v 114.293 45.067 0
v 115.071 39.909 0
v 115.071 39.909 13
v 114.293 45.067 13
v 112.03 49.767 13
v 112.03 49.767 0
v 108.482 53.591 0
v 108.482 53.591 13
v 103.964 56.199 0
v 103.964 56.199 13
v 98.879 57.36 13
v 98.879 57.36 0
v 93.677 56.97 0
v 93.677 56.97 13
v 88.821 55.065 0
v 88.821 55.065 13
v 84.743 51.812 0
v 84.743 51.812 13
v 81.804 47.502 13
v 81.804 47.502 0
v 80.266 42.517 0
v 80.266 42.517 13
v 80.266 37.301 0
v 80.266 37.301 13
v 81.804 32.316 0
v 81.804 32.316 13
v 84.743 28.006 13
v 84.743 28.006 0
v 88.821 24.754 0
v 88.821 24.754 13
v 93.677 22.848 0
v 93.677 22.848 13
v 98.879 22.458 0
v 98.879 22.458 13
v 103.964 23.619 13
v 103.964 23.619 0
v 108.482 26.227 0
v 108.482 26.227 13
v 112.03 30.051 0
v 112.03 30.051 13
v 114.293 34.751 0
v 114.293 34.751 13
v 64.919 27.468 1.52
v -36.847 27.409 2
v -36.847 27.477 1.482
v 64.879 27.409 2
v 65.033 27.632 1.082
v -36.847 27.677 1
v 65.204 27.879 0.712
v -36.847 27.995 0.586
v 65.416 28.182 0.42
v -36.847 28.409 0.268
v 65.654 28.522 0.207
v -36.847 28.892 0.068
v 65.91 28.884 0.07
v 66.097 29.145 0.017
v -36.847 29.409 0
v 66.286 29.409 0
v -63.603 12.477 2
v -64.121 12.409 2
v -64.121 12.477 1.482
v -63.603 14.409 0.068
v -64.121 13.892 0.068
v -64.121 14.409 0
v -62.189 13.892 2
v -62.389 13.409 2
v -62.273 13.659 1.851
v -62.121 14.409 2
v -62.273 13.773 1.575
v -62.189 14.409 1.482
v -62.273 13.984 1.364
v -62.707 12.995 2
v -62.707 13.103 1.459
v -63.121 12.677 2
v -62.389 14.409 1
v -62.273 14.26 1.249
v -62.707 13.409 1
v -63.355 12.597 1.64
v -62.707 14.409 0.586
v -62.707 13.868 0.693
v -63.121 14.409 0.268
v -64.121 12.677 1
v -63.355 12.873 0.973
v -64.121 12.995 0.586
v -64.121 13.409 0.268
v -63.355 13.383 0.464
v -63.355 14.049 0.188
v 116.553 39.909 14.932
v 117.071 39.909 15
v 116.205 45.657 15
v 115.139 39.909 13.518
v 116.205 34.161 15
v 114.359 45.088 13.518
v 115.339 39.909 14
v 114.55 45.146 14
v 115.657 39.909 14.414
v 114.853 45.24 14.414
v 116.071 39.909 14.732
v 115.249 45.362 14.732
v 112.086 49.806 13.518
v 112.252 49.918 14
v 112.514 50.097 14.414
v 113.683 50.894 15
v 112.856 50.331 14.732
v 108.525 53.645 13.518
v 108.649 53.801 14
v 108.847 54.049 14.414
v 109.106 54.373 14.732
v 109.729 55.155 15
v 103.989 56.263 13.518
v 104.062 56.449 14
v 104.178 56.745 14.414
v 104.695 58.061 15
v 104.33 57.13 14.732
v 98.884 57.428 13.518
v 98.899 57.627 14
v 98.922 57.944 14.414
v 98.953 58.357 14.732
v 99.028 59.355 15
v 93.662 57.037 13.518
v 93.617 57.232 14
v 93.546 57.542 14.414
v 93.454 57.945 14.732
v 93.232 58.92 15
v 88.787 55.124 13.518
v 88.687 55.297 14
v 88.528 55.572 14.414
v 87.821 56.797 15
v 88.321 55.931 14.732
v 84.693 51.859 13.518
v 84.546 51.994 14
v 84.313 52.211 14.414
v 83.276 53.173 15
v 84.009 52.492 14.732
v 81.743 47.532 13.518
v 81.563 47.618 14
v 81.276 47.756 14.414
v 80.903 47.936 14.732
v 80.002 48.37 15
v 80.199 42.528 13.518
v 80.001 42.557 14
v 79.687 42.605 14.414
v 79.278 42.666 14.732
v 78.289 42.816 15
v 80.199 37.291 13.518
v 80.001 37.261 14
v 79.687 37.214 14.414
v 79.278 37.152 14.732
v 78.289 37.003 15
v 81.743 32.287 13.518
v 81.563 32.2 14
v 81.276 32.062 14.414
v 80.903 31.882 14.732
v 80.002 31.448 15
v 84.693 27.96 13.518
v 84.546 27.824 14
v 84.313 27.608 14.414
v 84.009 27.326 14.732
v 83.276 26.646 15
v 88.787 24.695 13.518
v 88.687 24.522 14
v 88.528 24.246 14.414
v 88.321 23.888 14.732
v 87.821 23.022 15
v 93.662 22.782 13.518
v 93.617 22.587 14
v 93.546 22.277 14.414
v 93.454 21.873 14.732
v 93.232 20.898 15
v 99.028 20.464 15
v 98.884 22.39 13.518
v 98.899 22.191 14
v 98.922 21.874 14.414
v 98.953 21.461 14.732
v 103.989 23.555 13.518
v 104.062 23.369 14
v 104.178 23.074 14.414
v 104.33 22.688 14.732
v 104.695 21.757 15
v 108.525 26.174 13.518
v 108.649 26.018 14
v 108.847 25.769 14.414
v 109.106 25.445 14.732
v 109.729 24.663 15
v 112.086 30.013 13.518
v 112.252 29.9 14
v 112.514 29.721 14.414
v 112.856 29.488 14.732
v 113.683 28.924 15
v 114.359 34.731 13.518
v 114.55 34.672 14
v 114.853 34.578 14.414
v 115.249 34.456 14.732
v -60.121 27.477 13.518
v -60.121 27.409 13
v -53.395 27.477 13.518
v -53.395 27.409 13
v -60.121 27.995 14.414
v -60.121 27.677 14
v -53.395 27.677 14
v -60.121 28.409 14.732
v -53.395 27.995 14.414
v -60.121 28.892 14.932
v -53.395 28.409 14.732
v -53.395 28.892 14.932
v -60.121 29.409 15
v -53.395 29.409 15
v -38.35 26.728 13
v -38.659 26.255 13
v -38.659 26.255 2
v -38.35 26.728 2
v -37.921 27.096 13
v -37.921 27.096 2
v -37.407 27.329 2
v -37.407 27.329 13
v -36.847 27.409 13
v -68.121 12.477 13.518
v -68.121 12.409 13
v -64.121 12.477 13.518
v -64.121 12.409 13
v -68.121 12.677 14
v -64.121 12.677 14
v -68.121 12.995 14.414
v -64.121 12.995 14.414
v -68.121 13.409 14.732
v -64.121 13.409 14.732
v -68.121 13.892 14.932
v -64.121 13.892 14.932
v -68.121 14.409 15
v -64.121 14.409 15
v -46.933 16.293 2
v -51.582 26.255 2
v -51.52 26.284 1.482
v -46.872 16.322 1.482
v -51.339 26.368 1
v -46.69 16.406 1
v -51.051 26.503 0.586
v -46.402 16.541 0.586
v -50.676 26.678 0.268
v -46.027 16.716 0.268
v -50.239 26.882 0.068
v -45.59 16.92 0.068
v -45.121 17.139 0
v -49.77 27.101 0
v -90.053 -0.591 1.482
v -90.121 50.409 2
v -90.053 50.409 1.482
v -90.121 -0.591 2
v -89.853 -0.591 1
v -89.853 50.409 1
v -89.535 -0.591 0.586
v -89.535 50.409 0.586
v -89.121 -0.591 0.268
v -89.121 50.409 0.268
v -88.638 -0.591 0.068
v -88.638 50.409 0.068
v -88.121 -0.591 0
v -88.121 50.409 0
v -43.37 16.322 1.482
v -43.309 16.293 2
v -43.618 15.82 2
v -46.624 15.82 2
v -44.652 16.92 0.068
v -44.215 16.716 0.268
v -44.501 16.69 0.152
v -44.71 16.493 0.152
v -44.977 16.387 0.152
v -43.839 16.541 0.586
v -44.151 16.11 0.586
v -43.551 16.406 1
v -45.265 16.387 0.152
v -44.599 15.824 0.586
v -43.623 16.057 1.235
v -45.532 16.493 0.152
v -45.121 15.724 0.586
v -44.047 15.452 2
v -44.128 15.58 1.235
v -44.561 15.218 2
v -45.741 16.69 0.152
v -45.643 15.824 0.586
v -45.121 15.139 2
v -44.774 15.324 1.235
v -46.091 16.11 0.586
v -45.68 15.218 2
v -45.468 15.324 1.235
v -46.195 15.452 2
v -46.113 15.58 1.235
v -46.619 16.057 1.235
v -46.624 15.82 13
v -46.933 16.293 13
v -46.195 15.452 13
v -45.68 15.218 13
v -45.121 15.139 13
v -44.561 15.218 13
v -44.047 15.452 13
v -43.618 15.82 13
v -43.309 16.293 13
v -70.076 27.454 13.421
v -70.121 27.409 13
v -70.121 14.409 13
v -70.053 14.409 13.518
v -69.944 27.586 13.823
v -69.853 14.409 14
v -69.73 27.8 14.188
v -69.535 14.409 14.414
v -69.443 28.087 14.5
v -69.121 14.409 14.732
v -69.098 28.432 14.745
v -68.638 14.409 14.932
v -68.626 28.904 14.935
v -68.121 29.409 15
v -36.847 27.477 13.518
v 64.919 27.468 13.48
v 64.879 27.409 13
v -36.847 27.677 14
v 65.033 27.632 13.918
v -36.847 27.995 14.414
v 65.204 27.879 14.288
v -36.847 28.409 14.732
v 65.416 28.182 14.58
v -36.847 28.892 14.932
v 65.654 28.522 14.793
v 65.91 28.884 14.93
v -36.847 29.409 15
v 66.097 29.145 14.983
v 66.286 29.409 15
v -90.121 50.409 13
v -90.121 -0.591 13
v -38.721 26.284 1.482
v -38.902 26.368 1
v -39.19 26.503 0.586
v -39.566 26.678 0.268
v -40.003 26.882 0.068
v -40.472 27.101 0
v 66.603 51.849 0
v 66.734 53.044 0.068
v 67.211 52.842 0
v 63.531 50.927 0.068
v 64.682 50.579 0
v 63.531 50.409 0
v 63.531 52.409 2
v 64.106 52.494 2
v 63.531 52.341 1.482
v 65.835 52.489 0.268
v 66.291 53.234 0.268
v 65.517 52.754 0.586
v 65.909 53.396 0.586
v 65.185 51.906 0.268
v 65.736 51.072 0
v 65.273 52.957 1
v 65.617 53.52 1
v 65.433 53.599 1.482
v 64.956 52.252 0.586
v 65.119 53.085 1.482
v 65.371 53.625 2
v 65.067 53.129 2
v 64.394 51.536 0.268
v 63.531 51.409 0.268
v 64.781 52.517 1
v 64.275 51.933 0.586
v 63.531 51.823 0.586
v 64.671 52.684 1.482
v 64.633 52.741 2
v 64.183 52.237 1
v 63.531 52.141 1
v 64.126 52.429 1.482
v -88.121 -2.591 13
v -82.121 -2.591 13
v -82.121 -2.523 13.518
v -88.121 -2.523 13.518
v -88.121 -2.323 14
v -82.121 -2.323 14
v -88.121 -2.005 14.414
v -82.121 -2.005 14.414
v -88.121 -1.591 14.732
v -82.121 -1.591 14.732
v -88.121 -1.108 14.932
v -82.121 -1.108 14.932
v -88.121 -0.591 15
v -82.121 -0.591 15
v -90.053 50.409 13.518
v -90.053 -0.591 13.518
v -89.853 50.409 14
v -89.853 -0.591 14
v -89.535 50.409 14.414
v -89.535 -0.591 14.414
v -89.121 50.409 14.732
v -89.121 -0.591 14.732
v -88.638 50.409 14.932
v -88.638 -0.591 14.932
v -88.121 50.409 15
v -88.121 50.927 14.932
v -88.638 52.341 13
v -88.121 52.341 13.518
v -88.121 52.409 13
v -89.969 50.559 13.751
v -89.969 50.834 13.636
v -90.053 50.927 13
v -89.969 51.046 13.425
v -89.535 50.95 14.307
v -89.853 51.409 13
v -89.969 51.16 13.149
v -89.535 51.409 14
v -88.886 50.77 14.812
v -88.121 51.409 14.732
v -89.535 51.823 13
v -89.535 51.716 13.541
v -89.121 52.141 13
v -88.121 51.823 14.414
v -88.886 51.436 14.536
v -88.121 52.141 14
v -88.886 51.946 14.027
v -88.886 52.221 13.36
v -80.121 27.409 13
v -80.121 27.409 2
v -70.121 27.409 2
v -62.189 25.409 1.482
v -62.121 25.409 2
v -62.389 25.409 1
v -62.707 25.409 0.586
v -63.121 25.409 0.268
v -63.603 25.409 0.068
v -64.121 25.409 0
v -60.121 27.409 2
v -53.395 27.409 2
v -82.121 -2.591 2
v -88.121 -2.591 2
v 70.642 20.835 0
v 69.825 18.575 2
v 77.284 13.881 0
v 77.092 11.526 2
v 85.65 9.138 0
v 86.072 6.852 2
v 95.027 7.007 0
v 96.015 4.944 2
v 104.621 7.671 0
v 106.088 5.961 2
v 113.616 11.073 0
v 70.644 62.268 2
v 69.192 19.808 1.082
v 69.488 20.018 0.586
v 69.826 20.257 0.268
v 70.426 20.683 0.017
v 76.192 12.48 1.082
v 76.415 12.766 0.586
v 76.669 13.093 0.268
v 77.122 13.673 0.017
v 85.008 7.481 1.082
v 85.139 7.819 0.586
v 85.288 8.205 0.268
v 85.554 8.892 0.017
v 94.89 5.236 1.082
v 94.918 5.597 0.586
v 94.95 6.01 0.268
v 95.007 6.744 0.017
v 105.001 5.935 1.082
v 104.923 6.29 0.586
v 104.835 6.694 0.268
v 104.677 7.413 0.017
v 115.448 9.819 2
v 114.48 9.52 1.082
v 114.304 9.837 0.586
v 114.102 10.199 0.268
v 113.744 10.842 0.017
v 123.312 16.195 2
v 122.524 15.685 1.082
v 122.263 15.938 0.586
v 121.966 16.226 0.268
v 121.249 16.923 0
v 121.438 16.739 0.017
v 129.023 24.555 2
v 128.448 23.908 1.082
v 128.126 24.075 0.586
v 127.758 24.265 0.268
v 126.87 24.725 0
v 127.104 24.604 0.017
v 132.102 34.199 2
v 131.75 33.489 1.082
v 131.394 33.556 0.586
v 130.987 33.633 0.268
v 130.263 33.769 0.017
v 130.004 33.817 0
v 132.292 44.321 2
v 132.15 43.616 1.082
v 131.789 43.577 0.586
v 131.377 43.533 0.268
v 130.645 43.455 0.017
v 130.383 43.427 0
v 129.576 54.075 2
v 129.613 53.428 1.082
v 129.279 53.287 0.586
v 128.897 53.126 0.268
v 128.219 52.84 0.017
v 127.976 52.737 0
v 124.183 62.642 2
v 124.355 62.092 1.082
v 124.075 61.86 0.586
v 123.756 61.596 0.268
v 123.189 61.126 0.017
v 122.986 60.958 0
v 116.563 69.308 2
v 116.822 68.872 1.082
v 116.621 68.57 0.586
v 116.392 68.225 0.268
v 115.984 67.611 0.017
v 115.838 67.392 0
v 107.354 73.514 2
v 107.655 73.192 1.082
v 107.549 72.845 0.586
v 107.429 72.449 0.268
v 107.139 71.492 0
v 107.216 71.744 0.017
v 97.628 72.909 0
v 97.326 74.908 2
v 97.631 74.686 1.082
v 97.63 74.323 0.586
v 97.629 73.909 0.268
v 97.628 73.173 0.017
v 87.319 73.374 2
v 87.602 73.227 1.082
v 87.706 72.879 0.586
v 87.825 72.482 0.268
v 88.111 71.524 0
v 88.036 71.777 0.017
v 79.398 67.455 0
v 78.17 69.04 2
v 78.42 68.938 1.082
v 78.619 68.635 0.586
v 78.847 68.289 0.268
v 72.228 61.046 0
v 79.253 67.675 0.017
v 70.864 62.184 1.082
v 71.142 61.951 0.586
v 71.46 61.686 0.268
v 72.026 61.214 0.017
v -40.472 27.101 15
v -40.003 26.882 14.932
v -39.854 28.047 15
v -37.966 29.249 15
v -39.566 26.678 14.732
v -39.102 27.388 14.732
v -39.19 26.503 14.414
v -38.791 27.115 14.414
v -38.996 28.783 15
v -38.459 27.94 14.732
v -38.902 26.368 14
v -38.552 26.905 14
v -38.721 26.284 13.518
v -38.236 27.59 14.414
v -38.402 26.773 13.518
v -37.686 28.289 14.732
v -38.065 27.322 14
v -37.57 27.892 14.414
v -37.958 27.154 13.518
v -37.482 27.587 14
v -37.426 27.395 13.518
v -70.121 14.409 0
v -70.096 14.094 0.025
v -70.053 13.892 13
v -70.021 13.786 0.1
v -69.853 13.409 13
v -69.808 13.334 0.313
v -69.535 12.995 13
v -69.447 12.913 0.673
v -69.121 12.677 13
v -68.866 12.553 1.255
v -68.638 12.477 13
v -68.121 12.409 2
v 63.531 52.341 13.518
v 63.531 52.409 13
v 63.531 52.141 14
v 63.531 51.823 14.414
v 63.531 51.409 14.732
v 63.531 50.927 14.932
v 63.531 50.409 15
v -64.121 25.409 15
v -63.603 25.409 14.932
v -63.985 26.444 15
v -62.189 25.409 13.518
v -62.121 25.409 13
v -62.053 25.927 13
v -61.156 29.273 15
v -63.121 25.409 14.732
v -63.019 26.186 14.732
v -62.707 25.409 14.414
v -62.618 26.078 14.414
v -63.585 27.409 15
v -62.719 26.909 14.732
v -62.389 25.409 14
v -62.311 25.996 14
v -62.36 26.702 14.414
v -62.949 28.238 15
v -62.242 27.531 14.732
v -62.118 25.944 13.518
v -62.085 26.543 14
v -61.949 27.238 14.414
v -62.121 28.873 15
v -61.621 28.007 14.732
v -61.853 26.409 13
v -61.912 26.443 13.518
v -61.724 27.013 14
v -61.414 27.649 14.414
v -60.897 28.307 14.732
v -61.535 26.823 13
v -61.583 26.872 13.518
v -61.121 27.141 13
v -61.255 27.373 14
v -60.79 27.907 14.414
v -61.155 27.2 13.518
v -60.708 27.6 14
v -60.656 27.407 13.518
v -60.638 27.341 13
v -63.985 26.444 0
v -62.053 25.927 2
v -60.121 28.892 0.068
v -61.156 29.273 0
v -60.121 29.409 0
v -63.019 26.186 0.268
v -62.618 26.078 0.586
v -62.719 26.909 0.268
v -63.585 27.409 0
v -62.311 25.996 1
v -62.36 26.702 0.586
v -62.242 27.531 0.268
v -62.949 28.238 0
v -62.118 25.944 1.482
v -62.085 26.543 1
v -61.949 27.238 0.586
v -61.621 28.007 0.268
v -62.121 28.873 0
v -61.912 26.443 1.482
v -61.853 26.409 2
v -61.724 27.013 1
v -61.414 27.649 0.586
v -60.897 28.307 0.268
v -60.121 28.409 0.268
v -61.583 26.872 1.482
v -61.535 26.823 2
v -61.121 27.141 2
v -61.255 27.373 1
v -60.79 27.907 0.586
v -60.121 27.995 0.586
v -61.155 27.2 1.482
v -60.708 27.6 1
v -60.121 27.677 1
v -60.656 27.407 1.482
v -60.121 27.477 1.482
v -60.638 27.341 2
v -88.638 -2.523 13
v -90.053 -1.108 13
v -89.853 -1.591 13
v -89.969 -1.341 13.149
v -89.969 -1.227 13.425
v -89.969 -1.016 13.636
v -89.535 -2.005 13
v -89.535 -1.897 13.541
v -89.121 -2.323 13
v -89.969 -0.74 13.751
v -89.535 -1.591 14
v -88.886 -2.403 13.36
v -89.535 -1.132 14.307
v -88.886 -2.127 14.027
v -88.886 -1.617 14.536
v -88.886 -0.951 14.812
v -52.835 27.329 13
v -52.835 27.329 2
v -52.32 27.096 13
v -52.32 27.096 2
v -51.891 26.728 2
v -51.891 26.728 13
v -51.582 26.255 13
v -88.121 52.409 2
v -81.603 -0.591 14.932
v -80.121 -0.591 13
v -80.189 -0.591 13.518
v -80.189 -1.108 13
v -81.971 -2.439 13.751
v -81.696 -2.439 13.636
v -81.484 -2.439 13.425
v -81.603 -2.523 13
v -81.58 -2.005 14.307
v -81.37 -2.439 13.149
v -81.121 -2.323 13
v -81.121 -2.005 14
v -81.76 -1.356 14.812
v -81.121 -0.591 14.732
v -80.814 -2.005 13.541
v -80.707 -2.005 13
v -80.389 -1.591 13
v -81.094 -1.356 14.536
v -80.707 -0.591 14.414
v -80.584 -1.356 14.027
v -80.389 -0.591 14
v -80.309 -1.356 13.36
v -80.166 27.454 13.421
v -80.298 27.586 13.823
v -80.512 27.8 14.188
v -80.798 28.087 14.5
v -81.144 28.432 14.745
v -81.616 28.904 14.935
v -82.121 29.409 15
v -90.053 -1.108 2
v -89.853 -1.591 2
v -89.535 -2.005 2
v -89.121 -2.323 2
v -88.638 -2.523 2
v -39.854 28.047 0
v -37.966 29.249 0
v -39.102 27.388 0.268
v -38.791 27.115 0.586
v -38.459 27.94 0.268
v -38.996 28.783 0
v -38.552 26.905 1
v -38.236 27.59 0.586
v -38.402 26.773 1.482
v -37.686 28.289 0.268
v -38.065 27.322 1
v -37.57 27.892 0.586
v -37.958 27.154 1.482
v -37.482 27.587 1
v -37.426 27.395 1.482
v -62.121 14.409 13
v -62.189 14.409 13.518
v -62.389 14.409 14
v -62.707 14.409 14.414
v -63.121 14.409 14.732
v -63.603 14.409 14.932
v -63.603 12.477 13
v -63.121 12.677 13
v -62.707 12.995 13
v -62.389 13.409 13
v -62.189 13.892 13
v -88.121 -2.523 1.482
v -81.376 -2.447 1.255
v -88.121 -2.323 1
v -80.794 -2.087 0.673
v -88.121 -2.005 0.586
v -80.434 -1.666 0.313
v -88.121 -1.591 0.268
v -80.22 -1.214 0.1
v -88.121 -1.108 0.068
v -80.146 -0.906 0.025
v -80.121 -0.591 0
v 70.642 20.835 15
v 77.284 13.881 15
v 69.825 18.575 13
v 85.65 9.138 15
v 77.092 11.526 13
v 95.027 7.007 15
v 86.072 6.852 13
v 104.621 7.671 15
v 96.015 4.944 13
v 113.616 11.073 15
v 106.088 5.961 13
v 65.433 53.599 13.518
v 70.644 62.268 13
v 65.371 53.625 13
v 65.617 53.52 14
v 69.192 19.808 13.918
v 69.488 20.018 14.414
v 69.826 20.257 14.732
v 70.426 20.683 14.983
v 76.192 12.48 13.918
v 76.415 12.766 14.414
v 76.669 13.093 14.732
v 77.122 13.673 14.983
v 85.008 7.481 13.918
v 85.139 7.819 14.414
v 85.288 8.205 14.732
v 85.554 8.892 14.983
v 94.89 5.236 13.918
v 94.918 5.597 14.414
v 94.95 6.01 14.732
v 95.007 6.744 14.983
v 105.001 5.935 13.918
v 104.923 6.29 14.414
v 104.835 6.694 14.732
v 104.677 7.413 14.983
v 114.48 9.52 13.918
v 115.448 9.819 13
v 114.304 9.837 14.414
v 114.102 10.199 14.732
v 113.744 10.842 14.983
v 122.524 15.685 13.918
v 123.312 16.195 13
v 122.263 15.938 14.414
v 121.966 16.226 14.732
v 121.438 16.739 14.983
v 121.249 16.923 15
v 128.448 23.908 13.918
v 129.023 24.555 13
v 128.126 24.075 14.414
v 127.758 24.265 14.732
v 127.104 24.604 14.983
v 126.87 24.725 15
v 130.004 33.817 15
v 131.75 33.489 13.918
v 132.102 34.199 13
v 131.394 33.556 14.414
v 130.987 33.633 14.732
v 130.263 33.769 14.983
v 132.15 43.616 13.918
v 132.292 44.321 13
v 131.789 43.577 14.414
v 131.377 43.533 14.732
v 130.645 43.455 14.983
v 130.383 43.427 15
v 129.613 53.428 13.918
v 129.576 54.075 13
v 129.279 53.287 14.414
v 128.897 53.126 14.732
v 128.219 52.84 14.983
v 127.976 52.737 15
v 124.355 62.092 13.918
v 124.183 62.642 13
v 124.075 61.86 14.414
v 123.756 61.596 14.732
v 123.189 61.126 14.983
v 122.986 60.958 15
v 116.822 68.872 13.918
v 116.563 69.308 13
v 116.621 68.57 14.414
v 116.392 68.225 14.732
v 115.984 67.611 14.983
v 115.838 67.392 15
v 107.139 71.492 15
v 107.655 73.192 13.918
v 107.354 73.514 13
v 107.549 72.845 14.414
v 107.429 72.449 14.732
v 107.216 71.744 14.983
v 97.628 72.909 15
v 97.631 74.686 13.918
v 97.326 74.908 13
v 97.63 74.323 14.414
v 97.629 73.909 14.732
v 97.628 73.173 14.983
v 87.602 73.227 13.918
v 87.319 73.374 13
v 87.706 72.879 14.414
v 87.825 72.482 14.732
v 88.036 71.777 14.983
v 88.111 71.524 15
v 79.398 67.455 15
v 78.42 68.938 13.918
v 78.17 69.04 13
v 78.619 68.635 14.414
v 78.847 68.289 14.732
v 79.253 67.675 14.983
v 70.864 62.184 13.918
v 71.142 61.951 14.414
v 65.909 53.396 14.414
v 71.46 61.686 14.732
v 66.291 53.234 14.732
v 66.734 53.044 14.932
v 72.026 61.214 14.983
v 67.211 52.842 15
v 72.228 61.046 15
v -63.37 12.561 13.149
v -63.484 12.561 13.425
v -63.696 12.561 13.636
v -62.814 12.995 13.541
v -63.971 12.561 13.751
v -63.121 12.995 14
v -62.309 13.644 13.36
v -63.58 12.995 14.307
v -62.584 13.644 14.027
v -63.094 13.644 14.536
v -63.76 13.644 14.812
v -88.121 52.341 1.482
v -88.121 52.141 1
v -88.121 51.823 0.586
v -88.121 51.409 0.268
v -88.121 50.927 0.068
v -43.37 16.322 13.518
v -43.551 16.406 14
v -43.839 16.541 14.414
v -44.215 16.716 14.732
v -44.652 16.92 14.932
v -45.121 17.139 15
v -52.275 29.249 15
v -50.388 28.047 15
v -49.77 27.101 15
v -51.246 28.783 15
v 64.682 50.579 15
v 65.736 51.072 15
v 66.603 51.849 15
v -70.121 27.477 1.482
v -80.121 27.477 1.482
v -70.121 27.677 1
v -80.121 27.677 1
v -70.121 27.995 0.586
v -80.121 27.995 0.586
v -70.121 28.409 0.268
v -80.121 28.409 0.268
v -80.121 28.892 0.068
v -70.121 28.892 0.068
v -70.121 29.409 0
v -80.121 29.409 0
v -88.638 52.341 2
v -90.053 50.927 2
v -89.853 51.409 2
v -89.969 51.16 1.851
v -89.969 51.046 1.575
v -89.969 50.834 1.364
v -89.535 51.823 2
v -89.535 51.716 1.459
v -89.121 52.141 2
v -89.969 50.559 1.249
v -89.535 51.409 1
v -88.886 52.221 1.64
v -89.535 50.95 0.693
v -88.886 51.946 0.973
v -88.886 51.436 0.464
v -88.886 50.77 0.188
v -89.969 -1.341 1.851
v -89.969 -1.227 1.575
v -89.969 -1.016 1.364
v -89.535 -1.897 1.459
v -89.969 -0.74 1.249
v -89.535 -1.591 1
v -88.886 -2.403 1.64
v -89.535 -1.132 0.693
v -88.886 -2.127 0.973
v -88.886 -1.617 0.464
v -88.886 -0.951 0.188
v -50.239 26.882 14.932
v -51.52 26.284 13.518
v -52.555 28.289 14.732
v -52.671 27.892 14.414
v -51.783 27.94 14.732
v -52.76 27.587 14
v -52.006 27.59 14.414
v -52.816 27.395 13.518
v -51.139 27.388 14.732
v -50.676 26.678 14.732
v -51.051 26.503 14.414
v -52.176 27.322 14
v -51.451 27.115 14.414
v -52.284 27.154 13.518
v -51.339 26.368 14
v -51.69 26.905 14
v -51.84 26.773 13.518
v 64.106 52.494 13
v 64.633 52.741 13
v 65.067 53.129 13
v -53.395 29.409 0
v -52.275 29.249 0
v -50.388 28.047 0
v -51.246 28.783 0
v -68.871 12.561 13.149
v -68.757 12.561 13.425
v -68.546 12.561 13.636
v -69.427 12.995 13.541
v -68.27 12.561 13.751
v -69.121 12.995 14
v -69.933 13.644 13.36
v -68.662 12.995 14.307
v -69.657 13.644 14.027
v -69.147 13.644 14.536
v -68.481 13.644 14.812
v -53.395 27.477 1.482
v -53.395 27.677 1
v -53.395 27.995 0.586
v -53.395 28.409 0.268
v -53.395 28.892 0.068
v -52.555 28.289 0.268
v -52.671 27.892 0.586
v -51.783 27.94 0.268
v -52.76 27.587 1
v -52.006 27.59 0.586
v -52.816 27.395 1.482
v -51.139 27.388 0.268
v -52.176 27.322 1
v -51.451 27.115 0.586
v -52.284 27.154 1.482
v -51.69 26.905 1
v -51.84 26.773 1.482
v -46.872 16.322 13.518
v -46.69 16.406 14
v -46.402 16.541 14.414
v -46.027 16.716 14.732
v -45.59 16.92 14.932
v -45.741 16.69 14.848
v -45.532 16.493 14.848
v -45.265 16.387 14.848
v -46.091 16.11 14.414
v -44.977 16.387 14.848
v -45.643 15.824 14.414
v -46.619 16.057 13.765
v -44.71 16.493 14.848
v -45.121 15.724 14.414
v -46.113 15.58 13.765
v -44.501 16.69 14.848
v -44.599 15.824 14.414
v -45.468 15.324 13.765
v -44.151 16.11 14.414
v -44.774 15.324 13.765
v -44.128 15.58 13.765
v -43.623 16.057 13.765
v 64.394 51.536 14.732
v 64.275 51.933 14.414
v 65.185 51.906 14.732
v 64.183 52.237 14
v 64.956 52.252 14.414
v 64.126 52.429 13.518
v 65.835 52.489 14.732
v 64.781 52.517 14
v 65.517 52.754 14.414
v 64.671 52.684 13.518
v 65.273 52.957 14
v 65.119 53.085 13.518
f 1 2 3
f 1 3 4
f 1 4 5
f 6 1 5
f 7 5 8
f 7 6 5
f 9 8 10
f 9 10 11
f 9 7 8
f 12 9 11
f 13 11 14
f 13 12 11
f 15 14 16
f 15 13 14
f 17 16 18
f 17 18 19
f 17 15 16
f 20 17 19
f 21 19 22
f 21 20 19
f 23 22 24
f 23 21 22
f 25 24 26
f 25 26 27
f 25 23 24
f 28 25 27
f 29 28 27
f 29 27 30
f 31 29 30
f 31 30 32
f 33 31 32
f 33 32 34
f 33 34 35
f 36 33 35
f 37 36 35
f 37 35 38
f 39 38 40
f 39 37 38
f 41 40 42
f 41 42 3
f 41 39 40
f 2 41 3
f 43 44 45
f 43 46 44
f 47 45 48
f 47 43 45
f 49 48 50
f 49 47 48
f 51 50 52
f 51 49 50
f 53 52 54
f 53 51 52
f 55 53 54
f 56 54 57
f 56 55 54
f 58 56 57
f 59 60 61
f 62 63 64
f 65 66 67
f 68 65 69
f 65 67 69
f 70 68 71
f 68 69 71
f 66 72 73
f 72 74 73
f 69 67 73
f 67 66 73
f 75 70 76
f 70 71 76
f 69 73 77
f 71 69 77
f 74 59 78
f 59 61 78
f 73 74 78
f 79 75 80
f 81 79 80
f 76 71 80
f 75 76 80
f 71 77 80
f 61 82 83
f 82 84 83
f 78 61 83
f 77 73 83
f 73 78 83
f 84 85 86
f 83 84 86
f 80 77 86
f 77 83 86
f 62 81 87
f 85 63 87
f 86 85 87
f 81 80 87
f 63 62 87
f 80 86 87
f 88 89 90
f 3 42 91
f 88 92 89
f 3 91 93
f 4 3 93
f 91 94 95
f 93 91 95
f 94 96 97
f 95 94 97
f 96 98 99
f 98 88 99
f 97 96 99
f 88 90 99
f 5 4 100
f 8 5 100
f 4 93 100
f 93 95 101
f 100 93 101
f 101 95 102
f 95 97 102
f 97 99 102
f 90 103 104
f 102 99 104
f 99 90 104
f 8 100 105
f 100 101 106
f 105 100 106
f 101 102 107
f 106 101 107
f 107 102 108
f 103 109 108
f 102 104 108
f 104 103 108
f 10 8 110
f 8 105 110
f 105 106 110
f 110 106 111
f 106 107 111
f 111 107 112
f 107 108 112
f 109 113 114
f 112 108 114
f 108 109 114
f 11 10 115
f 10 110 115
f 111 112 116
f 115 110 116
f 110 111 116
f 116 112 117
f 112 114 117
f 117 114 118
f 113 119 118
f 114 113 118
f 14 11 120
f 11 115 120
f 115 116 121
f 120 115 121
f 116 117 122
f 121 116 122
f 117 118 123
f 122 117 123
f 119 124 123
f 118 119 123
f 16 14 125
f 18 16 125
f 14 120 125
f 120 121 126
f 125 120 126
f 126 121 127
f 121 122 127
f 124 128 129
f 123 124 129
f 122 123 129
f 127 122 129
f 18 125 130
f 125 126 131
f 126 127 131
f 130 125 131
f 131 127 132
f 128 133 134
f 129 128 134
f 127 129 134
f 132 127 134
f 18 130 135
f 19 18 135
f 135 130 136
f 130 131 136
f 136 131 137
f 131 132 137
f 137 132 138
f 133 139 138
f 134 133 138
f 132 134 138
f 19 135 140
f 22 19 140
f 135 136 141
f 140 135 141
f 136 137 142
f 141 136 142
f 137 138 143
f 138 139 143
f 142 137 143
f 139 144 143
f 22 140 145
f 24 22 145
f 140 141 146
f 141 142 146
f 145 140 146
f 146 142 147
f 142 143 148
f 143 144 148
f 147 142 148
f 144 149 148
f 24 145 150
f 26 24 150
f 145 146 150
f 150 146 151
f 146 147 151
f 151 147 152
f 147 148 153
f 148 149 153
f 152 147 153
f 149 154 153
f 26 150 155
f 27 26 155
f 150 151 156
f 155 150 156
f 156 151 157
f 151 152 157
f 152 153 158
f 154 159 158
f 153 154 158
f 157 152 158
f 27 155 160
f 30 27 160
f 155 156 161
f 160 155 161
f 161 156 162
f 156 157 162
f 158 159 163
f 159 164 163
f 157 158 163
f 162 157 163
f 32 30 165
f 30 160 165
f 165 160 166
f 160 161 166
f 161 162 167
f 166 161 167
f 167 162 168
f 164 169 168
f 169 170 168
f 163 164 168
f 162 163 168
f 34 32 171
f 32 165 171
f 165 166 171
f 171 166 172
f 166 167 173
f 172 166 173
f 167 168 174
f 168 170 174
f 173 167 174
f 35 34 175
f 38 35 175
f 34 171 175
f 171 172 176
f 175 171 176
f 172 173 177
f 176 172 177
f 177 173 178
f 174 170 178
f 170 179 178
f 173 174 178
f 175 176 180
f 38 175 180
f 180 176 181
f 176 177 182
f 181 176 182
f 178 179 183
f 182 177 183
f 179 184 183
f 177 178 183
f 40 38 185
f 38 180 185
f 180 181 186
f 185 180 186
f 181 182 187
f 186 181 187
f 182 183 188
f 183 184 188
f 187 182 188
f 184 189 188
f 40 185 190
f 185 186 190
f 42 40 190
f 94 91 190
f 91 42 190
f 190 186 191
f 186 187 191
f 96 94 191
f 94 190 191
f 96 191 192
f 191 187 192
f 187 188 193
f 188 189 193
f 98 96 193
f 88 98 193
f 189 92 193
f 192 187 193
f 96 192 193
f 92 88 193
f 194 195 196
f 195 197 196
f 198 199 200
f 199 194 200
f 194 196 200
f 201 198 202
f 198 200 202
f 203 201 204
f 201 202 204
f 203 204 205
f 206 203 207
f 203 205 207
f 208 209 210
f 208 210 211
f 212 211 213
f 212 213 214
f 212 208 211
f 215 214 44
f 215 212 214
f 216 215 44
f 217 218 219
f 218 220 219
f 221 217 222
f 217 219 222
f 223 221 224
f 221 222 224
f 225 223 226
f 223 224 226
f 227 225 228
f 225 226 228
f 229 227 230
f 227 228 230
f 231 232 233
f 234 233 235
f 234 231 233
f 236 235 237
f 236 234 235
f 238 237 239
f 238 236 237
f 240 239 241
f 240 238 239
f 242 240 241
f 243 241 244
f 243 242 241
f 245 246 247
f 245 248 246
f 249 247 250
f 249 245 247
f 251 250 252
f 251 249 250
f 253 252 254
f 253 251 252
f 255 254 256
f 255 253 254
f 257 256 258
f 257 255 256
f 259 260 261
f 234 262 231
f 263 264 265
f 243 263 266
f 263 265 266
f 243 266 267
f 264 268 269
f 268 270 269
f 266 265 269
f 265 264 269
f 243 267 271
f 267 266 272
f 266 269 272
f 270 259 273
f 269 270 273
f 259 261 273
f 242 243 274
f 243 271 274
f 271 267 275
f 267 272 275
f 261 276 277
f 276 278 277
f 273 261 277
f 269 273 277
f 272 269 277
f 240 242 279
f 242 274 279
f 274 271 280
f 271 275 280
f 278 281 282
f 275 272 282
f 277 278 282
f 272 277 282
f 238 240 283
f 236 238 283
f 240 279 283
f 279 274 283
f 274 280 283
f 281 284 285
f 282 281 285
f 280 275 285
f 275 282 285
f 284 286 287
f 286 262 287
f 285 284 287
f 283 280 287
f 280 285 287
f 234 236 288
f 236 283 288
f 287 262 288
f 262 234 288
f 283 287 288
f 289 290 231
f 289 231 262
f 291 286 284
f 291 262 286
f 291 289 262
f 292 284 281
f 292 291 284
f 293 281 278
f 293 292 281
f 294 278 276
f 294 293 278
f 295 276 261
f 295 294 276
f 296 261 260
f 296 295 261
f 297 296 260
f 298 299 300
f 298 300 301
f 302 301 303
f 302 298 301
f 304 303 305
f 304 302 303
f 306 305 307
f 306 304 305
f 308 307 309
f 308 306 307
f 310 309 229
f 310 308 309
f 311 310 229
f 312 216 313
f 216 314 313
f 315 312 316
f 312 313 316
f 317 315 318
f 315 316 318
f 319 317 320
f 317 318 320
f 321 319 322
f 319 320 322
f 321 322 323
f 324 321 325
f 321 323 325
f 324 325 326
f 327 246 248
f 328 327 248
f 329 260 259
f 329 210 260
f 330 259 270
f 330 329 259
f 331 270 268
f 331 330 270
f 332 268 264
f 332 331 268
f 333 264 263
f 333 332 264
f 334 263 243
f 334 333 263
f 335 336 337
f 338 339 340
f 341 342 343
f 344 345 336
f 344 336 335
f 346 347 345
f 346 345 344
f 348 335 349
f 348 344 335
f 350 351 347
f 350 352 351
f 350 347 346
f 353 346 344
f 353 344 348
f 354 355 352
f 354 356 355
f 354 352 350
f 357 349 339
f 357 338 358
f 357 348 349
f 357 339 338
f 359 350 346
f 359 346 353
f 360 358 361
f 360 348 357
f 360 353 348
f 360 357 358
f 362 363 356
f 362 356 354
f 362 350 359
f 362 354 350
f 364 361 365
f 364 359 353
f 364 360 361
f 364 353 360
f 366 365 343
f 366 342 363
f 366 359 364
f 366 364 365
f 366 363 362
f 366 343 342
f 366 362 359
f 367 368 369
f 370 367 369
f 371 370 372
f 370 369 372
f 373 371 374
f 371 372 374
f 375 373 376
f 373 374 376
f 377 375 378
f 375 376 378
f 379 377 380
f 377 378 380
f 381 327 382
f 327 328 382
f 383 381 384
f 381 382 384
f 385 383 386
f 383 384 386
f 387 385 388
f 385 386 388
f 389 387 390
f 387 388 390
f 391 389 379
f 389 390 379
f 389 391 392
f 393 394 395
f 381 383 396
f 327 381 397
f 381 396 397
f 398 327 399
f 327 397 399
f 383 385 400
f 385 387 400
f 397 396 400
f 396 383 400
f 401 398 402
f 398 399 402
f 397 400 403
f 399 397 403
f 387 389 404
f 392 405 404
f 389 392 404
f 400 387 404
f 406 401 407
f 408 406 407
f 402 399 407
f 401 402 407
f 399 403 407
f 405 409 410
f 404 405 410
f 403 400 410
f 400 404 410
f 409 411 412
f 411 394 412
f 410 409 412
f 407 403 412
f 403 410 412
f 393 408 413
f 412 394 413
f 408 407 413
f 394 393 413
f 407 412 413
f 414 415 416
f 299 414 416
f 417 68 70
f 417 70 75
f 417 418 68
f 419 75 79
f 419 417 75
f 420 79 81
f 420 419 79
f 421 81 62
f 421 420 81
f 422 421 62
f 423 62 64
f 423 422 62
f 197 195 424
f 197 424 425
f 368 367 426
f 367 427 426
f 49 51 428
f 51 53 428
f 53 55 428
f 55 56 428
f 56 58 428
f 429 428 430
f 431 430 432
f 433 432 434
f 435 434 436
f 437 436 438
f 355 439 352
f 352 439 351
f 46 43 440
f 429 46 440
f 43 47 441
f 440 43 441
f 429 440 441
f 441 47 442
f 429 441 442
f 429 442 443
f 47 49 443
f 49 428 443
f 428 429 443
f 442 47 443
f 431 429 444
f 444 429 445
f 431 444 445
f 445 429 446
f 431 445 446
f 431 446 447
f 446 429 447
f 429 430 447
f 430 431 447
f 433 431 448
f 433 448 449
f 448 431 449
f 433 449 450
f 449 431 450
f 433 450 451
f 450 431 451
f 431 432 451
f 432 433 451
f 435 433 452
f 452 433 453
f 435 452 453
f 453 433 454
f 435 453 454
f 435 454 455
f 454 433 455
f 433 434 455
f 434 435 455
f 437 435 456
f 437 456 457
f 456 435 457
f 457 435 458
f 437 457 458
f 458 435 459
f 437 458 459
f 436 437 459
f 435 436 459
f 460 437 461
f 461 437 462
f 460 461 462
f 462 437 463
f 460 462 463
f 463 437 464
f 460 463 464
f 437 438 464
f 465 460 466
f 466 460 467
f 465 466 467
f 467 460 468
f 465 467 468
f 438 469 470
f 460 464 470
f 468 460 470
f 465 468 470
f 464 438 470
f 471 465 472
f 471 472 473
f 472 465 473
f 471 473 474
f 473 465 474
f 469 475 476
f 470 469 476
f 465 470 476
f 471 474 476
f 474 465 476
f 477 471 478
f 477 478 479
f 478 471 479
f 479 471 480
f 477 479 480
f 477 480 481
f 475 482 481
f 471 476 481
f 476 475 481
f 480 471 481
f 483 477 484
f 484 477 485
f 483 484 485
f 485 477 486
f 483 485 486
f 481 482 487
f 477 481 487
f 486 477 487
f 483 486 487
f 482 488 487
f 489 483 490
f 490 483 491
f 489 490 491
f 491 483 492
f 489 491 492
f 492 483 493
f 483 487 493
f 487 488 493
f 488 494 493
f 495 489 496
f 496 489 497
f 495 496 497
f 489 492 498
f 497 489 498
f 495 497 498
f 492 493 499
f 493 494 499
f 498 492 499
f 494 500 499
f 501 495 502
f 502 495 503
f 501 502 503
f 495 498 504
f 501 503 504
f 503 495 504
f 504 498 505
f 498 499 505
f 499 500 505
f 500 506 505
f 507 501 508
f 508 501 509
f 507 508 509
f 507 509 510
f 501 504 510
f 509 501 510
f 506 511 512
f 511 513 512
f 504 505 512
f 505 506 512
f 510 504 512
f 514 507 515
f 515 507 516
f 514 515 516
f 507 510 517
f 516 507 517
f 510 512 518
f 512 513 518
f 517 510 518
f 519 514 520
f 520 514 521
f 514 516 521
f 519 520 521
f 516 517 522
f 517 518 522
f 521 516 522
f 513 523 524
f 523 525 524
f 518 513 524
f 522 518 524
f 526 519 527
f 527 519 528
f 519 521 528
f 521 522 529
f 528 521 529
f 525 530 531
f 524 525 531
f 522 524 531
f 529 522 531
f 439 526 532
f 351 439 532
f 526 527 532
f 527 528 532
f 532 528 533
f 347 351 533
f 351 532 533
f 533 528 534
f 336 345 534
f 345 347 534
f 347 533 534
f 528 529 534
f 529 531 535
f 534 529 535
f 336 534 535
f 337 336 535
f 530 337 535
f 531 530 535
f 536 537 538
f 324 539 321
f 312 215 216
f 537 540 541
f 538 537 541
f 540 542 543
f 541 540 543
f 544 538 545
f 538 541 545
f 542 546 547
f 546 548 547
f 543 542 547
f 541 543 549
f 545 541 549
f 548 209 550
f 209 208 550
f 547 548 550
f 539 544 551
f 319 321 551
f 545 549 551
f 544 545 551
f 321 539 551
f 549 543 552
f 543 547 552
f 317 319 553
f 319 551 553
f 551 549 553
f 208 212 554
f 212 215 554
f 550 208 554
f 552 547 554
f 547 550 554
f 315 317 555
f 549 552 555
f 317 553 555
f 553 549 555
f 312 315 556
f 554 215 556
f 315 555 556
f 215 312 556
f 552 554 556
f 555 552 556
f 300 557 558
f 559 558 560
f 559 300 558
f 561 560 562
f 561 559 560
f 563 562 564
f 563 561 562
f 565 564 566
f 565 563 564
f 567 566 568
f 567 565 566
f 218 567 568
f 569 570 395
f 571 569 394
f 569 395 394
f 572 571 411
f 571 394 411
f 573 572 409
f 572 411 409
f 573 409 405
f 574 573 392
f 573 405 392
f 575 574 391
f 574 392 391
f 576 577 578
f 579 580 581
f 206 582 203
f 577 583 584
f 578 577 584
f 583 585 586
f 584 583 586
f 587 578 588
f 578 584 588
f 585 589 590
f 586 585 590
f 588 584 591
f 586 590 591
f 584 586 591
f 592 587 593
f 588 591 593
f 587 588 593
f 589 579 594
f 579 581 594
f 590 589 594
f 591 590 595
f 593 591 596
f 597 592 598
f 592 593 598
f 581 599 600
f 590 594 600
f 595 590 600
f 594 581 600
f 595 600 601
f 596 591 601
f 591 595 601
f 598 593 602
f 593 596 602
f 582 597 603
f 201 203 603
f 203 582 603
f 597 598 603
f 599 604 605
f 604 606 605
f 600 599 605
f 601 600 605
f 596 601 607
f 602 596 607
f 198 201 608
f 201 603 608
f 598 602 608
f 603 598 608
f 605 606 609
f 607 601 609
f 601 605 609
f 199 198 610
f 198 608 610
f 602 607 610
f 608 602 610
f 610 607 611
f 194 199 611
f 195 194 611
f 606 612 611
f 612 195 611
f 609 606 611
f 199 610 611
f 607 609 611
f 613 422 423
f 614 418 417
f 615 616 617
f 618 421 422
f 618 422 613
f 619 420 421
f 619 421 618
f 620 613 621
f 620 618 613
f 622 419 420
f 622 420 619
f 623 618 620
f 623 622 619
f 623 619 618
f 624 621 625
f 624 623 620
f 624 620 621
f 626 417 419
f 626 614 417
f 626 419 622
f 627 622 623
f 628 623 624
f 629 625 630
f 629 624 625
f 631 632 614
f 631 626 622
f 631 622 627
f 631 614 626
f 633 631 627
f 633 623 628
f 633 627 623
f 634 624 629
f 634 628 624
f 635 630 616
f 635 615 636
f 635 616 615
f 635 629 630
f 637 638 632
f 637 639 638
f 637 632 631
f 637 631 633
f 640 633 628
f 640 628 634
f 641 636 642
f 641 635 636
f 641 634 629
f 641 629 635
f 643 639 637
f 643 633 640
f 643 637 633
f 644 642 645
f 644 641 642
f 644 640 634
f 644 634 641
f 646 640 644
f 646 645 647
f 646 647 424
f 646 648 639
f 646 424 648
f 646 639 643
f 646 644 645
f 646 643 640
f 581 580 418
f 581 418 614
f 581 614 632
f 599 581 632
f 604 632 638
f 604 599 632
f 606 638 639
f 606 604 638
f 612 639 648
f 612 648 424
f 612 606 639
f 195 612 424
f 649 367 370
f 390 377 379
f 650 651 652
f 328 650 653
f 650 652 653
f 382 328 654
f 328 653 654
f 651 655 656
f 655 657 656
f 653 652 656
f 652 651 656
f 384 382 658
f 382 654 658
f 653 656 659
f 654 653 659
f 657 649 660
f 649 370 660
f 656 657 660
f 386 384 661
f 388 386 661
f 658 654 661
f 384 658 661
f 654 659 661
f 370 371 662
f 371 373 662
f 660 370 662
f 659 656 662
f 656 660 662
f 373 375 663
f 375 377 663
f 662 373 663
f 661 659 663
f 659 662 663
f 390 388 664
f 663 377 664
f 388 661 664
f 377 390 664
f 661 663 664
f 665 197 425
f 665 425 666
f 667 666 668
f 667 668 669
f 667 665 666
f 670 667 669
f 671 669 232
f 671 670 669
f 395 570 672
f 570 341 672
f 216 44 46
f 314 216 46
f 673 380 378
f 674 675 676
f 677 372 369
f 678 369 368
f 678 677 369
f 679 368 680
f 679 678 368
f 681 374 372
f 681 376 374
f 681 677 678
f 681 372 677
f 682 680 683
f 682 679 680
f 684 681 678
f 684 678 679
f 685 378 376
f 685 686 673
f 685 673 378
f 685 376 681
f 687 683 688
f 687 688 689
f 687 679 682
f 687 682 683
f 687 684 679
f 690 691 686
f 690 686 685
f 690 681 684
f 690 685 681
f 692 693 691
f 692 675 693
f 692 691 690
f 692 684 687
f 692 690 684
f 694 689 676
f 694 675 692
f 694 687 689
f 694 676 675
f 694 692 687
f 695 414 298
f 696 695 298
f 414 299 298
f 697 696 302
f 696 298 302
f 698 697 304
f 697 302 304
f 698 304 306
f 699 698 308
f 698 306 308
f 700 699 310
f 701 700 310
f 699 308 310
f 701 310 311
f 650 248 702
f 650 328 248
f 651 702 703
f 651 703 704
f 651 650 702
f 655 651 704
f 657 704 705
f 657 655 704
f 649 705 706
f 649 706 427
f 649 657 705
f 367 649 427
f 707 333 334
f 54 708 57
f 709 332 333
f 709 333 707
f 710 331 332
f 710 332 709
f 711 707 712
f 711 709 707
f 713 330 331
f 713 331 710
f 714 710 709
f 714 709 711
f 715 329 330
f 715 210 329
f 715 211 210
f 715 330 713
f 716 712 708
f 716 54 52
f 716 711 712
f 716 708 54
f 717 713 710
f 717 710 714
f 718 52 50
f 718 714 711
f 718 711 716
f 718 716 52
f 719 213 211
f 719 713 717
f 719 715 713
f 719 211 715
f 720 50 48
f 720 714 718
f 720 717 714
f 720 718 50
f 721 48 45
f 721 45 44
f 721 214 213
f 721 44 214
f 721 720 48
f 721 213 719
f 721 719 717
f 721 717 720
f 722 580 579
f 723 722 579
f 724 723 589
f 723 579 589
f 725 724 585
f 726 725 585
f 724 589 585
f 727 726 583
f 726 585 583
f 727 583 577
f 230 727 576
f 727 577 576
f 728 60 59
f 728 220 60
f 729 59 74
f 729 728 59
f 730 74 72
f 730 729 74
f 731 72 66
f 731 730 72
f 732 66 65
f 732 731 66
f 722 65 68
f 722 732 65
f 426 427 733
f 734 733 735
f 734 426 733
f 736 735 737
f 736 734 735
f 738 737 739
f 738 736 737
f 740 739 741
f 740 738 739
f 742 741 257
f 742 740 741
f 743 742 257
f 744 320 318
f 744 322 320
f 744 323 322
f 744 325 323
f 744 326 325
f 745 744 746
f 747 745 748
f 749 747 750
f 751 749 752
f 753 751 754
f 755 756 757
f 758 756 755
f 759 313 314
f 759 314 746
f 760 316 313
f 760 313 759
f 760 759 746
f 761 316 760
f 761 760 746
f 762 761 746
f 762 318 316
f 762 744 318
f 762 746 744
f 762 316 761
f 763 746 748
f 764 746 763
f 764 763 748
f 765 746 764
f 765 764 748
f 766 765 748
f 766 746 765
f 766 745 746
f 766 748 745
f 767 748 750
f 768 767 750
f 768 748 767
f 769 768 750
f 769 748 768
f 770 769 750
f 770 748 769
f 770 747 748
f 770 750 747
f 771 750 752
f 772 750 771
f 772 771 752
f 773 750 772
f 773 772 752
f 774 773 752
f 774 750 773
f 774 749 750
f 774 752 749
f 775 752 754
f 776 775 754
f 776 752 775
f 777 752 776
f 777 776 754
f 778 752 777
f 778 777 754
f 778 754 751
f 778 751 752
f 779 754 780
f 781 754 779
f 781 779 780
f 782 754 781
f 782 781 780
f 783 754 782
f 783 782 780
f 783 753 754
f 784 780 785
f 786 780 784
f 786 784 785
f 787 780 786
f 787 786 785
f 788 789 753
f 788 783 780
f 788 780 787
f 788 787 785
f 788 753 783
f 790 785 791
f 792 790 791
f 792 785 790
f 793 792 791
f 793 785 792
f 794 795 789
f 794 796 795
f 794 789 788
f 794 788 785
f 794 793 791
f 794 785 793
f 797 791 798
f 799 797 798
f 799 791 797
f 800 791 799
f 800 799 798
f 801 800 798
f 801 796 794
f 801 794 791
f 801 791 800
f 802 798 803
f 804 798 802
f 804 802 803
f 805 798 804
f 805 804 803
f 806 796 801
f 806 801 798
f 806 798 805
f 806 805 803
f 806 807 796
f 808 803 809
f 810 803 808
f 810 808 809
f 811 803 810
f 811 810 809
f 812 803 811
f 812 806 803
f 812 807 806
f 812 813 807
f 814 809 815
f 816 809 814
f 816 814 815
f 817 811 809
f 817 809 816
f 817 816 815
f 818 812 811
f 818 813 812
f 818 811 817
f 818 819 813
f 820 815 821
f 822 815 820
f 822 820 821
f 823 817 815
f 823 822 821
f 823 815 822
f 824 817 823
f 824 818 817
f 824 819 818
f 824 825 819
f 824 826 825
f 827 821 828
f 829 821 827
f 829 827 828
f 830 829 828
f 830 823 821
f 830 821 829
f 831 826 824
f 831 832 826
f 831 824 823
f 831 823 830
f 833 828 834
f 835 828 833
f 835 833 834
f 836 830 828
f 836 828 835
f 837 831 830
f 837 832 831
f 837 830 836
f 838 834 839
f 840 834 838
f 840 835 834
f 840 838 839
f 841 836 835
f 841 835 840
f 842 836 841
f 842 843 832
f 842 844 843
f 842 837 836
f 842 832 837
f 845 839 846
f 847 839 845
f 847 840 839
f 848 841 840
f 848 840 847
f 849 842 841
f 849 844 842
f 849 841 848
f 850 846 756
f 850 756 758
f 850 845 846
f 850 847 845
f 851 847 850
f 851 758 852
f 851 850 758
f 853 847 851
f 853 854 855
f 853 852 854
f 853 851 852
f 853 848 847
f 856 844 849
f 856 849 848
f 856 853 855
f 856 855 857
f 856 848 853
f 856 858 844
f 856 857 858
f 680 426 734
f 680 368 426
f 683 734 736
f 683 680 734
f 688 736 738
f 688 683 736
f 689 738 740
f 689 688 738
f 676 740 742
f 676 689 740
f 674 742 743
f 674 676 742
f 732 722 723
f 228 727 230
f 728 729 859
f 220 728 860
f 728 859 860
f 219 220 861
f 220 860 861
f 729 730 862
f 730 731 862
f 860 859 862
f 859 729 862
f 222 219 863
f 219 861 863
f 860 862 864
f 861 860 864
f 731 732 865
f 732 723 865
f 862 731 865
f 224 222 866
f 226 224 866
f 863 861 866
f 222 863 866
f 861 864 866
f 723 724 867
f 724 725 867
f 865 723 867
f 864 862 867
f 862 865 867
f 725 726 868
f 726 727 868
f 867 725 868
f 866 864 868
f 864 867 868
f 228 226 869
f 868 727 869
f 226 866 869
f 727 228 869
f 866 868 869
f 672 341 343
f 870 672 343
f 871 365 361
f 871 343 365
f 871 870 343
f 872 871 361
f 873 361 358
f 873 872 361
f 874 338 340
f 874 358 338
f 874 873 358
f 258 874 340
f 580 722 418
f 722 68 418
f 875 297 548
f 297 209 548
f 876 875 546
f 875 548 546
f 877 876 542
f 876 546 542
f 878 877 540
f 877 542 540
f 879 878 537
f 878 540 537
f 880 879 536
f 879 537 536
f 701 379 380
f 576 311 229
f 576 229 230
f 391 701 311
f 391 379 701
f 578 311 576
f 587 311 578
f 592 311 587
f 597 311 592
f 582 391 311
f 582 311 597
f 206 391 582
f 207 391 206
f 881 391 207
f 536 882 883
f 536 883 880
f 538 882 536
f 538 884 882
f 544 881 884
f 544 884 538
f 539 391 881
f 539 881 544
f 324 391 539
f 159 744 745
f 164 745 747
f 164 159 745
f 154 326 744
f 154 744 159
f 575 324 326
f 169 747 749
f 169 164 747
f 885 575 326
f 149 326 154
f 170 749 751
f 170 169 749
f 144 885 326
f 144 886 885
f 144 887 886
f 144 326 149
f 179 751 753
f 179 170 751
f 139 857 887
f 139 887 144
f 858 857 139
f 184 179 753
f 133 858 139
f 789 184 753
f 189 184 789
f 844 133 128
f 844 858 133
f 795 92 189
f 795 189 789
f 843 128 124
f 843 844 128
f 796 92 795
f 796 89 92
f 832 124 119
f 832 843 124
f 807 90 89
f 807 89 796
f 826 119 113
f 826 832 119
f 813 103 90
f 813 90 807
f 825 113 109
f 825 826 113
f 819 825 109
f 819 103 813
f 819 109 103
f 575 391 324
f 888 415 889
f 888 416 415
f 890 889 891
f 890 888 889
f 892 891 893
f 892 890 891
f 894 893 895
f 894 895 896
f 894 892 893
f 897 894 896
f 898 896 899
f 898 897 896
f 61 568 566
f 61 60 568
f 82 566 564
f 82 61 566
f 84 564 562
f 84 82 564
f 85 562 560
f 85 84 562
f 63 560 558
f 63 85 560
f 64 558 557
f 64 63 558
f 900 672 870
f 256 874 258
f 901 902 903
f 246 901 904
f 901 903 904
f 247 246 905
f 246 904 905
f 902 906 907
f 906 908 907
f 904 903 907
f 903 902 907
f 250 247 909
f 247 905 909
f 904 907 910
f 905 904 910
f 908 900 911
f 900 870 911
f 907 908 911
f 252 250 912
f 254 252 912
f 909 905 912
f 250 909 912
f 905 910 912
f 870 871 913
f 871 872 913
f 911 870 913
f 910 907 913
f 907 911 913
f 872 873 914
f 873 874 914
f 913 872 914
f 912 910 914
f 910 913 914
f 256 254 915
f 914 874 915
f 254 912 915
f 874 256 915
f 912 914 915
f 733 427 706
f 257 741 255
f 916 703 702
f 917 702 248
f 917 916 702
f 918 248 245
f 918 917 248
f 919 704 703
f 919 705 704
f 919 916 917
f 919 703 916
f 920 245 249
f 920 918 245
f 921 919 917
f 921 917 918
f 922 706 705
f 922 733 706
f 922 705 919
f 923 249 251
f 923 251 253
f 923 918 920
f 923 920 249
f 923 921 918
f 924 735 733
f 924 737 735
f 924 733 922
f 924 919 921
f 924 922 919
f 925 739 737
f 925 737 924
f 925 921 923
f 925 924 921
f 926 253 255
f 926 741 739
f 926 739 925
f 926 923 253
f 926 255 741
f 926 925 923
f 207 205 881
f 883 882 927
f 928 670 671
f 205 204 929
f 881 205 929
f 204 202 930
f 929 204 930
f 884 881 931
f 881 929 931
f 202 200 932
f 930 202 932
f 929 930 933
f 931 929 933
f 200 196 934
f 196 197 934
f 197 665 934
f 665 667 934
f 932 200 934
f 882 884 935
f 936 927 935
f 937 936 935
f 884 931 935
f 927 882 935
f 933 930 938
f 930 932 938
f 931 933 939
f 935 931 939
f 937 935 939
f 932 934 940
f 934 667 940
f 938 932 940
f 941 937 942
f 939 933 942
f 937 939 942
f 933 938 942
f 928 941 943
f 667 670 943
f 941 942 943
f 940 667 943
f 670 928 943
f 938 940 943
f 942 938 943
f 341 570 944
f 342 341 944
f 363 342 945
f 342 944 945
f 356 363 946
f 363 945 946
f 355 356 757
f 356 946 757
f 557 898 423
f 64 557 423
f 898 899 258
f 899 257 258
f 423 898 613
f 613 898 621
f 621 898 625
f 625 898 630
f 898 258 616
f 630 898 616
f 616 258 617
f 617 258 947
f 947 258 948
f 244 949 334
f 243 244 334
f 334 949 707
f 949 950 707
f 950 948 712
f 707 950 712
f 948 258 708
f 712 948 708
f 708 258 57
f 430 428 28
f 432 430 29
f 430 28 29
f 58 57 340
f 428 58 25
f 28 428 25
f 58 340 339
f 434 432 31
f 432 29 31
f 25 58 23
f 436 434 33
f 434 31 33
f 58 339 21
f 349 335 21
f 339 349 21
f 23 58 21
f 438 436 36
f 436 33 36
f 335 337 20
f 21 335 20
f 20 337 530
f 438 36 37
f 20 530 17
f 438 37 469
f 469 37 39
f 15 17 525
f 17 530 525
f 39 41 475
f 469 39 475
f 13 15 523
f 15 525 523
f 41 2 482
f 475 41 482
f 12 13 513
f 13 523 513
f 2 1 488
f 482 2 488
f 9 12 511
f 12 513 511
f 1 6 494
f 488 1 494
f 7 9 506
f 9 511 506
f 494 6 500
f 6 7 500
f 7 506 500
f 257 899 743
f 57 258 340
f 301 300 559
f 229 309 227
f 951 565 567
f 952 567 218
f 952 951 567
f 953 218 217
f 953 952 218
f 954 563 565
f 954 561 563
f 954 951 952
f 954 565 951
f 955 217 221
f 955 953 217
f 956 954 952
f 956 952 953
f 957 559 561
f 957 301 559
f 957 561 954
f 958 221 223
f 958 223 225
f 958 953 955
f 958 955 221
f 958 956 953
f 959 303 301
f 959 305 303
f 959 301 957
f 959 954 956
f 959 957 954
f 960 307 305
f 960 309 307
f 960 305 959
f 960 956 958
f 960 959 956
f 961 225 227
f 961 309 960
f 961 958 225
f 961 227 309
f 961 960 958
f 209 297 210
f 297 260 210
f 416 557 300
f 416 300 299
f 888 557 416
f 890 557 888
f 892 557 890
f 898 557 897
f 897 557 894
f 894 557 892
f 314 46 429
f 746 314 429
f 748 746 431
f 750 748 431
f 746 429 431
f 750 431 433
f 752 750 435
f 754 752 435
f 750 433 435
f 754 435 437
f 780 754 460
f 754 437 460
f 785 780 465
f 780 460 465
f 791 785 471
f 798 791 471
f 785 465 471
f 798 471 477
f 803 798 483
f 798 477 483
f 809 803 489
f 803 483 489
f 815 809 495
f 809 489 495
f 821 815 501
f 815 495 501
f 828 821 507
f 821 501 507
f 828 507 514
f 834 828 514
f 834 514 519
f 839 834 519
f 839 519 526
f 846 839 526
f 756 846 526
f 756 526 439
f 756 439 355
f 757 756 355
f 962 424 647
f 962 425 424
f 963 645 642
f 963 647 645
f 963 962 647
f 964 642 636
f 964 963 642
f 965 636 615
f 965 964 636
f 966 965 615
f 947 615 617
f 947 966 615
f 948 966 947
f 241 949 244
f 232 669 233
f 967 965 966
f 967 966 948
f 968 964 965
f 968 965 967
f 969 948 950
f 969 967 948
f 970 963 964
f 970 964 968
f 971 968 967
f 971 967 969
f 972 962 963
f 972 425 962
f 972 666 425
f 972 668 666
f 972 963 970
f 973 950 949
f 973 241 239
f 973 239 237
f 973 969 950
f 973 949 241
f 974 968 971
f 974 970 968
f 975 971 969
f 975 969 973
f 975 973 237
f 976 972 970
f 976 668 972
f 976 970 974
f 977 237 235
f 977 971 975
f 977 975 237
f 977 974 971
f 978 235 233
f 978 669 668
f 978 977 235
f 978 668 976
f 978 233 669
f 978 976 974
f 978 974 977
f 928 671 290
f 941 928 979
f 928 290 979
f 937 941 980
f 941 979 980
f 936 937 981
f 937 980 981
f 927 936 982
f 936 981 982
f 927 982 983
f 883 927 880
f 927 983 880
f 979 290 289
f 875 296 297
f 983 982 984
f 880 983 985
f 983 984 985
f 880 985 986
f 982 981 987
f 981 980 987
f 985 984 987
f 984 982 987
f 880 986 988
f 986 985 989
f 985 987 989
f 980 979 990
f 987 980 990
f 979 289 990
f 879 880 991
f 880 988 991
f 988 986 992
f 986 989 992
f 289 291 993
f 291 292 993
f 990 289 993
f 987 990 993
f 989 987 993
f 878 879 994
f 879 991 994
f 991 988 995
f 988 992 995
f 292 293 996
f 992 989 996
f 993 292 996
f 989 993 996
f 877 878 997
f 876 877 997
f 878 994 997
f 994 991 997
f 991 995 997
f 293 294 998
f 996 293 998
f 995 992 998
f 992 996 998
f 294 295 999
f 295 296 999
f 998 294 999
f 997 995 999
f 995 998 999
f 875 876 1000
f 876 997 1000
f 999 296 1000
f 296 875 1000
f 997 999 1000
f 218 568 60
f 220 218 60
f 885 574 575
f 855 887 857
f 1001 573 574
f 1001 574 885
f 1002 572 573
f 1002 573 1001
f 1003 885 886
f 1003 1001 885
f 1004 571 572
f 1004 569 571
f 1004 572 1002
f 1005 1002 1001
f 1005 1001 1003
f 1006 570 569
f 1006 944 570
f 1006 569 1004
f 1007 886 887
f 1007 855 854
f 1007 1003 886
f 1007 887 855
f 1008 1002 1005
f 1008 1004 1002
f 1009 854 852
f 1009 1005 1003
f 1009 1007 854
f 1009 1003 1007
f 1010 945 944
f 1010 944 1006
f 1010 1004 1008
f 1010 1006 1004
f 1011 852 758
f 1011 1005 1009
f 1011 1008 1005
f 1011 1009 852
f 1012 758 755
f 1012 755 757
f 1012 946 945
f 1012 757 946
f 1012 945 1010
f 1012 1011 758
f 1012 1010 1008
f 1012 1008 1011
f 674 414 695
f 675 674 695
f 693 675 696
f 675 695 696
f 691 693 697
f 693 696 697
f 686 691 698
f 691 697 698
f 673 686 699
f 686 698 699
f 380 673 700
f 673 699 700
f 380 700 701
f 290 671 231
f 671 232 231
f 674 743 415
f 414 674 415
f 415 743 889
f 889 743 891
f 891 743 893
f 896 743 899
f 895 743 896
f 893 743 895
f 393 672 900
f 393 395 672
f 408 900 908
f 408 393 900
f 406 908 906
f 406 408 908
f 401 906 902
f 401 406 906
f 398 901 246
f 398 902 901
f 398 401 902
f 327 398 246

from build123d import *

# Parameters (mm, degrees)
F0_R     = 17.5
F0_W     = 10
F0_H     = 30
F0_W_2   = 8
F0_H_2   = 15
F1_DEPTH = 15
F2_R     = 2


with BuildPart() as f1:
    # F0 (on Top) → F1 (new body)
    with BuildSketch(Plane.XY):
        Polygon((64.8791989386, 52.4091998301), (-90.1208010614, 52.4091998301), (-90.1208010614, 27.4091998301), (-80.1208010614, 27.4091998301), (-70.1208010614, 27.4091998301), (-62.1208010614, 27.4091998301), (-52.1208010614, 27.4091998301), (-45.1209302745, 27.4091998301), (-38.1208010614, 27.4091998301), (64.8791989386, 27.4091998301), align=None)
        with BuildLine():
            ThreePointArc((64.8791989386, 27.4091998301), (132.5709410152, 39.9091998301), (64.8791989386, 52.4091998301))
            Line((64.8791989386, 52.4091998301), (64.8791989386, 27.4091998301))
        make_face()
        with Locations((97.5709410152, 39.9091998301)):
            Circle(F0_R, mode=Mode.SUBTRACT)
        with Locations((-85.1208010614, 12.4091998301)):
            Rectangle(F0_W, F0_H)
        Polygon((-45.1209302745, 12.4091998301), (-38.1208010614, 27.4091998301), (-45.1209302745, 27.4091998301), (-52.1208010614, 27.4091998301), align=None)
        with Locations((-66.1208010614, 19.9091998301)):
            Rectangle(F0_W_2, F0_H_2)
    extrude(amount=F1_DEPTH)

    # F2
    f2_edges = [f1.edges().sort_by_distance(p)[0] for p in [
        (-75.120801, 27.4092, 15),
        (-70.120801, 19.9092, 15),
        (-62.120801, 19.9092, 15),
        (-66.120801, 12.4092, 0),
        (-62.120801, 12.4092, 7.5),
        (-70.120801, 12.4092, 7.5),
        (-80.120801, 12.4092, 15),
        (-85.120801, -2.5908, 15),
        (-85.120801, -2.5908, 0),
        (-90.120801, -2.5908, 7.5),
        (-80.120801, -2.5908, 7.5),
        (-75.120801, 27.4092, 0),
        (-66.120801, 12.4092, 15),
        (-12.620801, 52.4092, 15),
        (-90.120801, 24.9092, 15),
        (-57.120801, 27.4092, 15),
        (-48.620866, 19.9092, 15),
        (-41.620866, 19.9092, 15),
        (13.379199, 27.4092, 15),
        (132.570941, 39.9092, 15),
        (80.070941, 39.9092, 15),
        (-45.12093, 12.4092, 7.5),
        (-38.120801, 27.4092, 7.5),
        (-41.620866, 19.9092, 0),
        (-48.620866, 19.9092, 0),
        (13.379199, 27.4092, 0),
        (132.570941, 39.9092, 0),
        (-12.620801, 52.4092, 0),
        (64.879199, 52.4092, 7.5),
        (-90.120801, 52.4092, 7.5),
        (-90.120801, 24.9092, 0),
        (-62.120801, 27.4092, 7.5),
        (-62.120801, 19.9092, 0),
        (-52.120801, 27.4092, 7.5),
        (-57.120801, 27.4092, 0),
    ]]
    fillet(f2_edges, radius=F2_R)


solid = f1.part
